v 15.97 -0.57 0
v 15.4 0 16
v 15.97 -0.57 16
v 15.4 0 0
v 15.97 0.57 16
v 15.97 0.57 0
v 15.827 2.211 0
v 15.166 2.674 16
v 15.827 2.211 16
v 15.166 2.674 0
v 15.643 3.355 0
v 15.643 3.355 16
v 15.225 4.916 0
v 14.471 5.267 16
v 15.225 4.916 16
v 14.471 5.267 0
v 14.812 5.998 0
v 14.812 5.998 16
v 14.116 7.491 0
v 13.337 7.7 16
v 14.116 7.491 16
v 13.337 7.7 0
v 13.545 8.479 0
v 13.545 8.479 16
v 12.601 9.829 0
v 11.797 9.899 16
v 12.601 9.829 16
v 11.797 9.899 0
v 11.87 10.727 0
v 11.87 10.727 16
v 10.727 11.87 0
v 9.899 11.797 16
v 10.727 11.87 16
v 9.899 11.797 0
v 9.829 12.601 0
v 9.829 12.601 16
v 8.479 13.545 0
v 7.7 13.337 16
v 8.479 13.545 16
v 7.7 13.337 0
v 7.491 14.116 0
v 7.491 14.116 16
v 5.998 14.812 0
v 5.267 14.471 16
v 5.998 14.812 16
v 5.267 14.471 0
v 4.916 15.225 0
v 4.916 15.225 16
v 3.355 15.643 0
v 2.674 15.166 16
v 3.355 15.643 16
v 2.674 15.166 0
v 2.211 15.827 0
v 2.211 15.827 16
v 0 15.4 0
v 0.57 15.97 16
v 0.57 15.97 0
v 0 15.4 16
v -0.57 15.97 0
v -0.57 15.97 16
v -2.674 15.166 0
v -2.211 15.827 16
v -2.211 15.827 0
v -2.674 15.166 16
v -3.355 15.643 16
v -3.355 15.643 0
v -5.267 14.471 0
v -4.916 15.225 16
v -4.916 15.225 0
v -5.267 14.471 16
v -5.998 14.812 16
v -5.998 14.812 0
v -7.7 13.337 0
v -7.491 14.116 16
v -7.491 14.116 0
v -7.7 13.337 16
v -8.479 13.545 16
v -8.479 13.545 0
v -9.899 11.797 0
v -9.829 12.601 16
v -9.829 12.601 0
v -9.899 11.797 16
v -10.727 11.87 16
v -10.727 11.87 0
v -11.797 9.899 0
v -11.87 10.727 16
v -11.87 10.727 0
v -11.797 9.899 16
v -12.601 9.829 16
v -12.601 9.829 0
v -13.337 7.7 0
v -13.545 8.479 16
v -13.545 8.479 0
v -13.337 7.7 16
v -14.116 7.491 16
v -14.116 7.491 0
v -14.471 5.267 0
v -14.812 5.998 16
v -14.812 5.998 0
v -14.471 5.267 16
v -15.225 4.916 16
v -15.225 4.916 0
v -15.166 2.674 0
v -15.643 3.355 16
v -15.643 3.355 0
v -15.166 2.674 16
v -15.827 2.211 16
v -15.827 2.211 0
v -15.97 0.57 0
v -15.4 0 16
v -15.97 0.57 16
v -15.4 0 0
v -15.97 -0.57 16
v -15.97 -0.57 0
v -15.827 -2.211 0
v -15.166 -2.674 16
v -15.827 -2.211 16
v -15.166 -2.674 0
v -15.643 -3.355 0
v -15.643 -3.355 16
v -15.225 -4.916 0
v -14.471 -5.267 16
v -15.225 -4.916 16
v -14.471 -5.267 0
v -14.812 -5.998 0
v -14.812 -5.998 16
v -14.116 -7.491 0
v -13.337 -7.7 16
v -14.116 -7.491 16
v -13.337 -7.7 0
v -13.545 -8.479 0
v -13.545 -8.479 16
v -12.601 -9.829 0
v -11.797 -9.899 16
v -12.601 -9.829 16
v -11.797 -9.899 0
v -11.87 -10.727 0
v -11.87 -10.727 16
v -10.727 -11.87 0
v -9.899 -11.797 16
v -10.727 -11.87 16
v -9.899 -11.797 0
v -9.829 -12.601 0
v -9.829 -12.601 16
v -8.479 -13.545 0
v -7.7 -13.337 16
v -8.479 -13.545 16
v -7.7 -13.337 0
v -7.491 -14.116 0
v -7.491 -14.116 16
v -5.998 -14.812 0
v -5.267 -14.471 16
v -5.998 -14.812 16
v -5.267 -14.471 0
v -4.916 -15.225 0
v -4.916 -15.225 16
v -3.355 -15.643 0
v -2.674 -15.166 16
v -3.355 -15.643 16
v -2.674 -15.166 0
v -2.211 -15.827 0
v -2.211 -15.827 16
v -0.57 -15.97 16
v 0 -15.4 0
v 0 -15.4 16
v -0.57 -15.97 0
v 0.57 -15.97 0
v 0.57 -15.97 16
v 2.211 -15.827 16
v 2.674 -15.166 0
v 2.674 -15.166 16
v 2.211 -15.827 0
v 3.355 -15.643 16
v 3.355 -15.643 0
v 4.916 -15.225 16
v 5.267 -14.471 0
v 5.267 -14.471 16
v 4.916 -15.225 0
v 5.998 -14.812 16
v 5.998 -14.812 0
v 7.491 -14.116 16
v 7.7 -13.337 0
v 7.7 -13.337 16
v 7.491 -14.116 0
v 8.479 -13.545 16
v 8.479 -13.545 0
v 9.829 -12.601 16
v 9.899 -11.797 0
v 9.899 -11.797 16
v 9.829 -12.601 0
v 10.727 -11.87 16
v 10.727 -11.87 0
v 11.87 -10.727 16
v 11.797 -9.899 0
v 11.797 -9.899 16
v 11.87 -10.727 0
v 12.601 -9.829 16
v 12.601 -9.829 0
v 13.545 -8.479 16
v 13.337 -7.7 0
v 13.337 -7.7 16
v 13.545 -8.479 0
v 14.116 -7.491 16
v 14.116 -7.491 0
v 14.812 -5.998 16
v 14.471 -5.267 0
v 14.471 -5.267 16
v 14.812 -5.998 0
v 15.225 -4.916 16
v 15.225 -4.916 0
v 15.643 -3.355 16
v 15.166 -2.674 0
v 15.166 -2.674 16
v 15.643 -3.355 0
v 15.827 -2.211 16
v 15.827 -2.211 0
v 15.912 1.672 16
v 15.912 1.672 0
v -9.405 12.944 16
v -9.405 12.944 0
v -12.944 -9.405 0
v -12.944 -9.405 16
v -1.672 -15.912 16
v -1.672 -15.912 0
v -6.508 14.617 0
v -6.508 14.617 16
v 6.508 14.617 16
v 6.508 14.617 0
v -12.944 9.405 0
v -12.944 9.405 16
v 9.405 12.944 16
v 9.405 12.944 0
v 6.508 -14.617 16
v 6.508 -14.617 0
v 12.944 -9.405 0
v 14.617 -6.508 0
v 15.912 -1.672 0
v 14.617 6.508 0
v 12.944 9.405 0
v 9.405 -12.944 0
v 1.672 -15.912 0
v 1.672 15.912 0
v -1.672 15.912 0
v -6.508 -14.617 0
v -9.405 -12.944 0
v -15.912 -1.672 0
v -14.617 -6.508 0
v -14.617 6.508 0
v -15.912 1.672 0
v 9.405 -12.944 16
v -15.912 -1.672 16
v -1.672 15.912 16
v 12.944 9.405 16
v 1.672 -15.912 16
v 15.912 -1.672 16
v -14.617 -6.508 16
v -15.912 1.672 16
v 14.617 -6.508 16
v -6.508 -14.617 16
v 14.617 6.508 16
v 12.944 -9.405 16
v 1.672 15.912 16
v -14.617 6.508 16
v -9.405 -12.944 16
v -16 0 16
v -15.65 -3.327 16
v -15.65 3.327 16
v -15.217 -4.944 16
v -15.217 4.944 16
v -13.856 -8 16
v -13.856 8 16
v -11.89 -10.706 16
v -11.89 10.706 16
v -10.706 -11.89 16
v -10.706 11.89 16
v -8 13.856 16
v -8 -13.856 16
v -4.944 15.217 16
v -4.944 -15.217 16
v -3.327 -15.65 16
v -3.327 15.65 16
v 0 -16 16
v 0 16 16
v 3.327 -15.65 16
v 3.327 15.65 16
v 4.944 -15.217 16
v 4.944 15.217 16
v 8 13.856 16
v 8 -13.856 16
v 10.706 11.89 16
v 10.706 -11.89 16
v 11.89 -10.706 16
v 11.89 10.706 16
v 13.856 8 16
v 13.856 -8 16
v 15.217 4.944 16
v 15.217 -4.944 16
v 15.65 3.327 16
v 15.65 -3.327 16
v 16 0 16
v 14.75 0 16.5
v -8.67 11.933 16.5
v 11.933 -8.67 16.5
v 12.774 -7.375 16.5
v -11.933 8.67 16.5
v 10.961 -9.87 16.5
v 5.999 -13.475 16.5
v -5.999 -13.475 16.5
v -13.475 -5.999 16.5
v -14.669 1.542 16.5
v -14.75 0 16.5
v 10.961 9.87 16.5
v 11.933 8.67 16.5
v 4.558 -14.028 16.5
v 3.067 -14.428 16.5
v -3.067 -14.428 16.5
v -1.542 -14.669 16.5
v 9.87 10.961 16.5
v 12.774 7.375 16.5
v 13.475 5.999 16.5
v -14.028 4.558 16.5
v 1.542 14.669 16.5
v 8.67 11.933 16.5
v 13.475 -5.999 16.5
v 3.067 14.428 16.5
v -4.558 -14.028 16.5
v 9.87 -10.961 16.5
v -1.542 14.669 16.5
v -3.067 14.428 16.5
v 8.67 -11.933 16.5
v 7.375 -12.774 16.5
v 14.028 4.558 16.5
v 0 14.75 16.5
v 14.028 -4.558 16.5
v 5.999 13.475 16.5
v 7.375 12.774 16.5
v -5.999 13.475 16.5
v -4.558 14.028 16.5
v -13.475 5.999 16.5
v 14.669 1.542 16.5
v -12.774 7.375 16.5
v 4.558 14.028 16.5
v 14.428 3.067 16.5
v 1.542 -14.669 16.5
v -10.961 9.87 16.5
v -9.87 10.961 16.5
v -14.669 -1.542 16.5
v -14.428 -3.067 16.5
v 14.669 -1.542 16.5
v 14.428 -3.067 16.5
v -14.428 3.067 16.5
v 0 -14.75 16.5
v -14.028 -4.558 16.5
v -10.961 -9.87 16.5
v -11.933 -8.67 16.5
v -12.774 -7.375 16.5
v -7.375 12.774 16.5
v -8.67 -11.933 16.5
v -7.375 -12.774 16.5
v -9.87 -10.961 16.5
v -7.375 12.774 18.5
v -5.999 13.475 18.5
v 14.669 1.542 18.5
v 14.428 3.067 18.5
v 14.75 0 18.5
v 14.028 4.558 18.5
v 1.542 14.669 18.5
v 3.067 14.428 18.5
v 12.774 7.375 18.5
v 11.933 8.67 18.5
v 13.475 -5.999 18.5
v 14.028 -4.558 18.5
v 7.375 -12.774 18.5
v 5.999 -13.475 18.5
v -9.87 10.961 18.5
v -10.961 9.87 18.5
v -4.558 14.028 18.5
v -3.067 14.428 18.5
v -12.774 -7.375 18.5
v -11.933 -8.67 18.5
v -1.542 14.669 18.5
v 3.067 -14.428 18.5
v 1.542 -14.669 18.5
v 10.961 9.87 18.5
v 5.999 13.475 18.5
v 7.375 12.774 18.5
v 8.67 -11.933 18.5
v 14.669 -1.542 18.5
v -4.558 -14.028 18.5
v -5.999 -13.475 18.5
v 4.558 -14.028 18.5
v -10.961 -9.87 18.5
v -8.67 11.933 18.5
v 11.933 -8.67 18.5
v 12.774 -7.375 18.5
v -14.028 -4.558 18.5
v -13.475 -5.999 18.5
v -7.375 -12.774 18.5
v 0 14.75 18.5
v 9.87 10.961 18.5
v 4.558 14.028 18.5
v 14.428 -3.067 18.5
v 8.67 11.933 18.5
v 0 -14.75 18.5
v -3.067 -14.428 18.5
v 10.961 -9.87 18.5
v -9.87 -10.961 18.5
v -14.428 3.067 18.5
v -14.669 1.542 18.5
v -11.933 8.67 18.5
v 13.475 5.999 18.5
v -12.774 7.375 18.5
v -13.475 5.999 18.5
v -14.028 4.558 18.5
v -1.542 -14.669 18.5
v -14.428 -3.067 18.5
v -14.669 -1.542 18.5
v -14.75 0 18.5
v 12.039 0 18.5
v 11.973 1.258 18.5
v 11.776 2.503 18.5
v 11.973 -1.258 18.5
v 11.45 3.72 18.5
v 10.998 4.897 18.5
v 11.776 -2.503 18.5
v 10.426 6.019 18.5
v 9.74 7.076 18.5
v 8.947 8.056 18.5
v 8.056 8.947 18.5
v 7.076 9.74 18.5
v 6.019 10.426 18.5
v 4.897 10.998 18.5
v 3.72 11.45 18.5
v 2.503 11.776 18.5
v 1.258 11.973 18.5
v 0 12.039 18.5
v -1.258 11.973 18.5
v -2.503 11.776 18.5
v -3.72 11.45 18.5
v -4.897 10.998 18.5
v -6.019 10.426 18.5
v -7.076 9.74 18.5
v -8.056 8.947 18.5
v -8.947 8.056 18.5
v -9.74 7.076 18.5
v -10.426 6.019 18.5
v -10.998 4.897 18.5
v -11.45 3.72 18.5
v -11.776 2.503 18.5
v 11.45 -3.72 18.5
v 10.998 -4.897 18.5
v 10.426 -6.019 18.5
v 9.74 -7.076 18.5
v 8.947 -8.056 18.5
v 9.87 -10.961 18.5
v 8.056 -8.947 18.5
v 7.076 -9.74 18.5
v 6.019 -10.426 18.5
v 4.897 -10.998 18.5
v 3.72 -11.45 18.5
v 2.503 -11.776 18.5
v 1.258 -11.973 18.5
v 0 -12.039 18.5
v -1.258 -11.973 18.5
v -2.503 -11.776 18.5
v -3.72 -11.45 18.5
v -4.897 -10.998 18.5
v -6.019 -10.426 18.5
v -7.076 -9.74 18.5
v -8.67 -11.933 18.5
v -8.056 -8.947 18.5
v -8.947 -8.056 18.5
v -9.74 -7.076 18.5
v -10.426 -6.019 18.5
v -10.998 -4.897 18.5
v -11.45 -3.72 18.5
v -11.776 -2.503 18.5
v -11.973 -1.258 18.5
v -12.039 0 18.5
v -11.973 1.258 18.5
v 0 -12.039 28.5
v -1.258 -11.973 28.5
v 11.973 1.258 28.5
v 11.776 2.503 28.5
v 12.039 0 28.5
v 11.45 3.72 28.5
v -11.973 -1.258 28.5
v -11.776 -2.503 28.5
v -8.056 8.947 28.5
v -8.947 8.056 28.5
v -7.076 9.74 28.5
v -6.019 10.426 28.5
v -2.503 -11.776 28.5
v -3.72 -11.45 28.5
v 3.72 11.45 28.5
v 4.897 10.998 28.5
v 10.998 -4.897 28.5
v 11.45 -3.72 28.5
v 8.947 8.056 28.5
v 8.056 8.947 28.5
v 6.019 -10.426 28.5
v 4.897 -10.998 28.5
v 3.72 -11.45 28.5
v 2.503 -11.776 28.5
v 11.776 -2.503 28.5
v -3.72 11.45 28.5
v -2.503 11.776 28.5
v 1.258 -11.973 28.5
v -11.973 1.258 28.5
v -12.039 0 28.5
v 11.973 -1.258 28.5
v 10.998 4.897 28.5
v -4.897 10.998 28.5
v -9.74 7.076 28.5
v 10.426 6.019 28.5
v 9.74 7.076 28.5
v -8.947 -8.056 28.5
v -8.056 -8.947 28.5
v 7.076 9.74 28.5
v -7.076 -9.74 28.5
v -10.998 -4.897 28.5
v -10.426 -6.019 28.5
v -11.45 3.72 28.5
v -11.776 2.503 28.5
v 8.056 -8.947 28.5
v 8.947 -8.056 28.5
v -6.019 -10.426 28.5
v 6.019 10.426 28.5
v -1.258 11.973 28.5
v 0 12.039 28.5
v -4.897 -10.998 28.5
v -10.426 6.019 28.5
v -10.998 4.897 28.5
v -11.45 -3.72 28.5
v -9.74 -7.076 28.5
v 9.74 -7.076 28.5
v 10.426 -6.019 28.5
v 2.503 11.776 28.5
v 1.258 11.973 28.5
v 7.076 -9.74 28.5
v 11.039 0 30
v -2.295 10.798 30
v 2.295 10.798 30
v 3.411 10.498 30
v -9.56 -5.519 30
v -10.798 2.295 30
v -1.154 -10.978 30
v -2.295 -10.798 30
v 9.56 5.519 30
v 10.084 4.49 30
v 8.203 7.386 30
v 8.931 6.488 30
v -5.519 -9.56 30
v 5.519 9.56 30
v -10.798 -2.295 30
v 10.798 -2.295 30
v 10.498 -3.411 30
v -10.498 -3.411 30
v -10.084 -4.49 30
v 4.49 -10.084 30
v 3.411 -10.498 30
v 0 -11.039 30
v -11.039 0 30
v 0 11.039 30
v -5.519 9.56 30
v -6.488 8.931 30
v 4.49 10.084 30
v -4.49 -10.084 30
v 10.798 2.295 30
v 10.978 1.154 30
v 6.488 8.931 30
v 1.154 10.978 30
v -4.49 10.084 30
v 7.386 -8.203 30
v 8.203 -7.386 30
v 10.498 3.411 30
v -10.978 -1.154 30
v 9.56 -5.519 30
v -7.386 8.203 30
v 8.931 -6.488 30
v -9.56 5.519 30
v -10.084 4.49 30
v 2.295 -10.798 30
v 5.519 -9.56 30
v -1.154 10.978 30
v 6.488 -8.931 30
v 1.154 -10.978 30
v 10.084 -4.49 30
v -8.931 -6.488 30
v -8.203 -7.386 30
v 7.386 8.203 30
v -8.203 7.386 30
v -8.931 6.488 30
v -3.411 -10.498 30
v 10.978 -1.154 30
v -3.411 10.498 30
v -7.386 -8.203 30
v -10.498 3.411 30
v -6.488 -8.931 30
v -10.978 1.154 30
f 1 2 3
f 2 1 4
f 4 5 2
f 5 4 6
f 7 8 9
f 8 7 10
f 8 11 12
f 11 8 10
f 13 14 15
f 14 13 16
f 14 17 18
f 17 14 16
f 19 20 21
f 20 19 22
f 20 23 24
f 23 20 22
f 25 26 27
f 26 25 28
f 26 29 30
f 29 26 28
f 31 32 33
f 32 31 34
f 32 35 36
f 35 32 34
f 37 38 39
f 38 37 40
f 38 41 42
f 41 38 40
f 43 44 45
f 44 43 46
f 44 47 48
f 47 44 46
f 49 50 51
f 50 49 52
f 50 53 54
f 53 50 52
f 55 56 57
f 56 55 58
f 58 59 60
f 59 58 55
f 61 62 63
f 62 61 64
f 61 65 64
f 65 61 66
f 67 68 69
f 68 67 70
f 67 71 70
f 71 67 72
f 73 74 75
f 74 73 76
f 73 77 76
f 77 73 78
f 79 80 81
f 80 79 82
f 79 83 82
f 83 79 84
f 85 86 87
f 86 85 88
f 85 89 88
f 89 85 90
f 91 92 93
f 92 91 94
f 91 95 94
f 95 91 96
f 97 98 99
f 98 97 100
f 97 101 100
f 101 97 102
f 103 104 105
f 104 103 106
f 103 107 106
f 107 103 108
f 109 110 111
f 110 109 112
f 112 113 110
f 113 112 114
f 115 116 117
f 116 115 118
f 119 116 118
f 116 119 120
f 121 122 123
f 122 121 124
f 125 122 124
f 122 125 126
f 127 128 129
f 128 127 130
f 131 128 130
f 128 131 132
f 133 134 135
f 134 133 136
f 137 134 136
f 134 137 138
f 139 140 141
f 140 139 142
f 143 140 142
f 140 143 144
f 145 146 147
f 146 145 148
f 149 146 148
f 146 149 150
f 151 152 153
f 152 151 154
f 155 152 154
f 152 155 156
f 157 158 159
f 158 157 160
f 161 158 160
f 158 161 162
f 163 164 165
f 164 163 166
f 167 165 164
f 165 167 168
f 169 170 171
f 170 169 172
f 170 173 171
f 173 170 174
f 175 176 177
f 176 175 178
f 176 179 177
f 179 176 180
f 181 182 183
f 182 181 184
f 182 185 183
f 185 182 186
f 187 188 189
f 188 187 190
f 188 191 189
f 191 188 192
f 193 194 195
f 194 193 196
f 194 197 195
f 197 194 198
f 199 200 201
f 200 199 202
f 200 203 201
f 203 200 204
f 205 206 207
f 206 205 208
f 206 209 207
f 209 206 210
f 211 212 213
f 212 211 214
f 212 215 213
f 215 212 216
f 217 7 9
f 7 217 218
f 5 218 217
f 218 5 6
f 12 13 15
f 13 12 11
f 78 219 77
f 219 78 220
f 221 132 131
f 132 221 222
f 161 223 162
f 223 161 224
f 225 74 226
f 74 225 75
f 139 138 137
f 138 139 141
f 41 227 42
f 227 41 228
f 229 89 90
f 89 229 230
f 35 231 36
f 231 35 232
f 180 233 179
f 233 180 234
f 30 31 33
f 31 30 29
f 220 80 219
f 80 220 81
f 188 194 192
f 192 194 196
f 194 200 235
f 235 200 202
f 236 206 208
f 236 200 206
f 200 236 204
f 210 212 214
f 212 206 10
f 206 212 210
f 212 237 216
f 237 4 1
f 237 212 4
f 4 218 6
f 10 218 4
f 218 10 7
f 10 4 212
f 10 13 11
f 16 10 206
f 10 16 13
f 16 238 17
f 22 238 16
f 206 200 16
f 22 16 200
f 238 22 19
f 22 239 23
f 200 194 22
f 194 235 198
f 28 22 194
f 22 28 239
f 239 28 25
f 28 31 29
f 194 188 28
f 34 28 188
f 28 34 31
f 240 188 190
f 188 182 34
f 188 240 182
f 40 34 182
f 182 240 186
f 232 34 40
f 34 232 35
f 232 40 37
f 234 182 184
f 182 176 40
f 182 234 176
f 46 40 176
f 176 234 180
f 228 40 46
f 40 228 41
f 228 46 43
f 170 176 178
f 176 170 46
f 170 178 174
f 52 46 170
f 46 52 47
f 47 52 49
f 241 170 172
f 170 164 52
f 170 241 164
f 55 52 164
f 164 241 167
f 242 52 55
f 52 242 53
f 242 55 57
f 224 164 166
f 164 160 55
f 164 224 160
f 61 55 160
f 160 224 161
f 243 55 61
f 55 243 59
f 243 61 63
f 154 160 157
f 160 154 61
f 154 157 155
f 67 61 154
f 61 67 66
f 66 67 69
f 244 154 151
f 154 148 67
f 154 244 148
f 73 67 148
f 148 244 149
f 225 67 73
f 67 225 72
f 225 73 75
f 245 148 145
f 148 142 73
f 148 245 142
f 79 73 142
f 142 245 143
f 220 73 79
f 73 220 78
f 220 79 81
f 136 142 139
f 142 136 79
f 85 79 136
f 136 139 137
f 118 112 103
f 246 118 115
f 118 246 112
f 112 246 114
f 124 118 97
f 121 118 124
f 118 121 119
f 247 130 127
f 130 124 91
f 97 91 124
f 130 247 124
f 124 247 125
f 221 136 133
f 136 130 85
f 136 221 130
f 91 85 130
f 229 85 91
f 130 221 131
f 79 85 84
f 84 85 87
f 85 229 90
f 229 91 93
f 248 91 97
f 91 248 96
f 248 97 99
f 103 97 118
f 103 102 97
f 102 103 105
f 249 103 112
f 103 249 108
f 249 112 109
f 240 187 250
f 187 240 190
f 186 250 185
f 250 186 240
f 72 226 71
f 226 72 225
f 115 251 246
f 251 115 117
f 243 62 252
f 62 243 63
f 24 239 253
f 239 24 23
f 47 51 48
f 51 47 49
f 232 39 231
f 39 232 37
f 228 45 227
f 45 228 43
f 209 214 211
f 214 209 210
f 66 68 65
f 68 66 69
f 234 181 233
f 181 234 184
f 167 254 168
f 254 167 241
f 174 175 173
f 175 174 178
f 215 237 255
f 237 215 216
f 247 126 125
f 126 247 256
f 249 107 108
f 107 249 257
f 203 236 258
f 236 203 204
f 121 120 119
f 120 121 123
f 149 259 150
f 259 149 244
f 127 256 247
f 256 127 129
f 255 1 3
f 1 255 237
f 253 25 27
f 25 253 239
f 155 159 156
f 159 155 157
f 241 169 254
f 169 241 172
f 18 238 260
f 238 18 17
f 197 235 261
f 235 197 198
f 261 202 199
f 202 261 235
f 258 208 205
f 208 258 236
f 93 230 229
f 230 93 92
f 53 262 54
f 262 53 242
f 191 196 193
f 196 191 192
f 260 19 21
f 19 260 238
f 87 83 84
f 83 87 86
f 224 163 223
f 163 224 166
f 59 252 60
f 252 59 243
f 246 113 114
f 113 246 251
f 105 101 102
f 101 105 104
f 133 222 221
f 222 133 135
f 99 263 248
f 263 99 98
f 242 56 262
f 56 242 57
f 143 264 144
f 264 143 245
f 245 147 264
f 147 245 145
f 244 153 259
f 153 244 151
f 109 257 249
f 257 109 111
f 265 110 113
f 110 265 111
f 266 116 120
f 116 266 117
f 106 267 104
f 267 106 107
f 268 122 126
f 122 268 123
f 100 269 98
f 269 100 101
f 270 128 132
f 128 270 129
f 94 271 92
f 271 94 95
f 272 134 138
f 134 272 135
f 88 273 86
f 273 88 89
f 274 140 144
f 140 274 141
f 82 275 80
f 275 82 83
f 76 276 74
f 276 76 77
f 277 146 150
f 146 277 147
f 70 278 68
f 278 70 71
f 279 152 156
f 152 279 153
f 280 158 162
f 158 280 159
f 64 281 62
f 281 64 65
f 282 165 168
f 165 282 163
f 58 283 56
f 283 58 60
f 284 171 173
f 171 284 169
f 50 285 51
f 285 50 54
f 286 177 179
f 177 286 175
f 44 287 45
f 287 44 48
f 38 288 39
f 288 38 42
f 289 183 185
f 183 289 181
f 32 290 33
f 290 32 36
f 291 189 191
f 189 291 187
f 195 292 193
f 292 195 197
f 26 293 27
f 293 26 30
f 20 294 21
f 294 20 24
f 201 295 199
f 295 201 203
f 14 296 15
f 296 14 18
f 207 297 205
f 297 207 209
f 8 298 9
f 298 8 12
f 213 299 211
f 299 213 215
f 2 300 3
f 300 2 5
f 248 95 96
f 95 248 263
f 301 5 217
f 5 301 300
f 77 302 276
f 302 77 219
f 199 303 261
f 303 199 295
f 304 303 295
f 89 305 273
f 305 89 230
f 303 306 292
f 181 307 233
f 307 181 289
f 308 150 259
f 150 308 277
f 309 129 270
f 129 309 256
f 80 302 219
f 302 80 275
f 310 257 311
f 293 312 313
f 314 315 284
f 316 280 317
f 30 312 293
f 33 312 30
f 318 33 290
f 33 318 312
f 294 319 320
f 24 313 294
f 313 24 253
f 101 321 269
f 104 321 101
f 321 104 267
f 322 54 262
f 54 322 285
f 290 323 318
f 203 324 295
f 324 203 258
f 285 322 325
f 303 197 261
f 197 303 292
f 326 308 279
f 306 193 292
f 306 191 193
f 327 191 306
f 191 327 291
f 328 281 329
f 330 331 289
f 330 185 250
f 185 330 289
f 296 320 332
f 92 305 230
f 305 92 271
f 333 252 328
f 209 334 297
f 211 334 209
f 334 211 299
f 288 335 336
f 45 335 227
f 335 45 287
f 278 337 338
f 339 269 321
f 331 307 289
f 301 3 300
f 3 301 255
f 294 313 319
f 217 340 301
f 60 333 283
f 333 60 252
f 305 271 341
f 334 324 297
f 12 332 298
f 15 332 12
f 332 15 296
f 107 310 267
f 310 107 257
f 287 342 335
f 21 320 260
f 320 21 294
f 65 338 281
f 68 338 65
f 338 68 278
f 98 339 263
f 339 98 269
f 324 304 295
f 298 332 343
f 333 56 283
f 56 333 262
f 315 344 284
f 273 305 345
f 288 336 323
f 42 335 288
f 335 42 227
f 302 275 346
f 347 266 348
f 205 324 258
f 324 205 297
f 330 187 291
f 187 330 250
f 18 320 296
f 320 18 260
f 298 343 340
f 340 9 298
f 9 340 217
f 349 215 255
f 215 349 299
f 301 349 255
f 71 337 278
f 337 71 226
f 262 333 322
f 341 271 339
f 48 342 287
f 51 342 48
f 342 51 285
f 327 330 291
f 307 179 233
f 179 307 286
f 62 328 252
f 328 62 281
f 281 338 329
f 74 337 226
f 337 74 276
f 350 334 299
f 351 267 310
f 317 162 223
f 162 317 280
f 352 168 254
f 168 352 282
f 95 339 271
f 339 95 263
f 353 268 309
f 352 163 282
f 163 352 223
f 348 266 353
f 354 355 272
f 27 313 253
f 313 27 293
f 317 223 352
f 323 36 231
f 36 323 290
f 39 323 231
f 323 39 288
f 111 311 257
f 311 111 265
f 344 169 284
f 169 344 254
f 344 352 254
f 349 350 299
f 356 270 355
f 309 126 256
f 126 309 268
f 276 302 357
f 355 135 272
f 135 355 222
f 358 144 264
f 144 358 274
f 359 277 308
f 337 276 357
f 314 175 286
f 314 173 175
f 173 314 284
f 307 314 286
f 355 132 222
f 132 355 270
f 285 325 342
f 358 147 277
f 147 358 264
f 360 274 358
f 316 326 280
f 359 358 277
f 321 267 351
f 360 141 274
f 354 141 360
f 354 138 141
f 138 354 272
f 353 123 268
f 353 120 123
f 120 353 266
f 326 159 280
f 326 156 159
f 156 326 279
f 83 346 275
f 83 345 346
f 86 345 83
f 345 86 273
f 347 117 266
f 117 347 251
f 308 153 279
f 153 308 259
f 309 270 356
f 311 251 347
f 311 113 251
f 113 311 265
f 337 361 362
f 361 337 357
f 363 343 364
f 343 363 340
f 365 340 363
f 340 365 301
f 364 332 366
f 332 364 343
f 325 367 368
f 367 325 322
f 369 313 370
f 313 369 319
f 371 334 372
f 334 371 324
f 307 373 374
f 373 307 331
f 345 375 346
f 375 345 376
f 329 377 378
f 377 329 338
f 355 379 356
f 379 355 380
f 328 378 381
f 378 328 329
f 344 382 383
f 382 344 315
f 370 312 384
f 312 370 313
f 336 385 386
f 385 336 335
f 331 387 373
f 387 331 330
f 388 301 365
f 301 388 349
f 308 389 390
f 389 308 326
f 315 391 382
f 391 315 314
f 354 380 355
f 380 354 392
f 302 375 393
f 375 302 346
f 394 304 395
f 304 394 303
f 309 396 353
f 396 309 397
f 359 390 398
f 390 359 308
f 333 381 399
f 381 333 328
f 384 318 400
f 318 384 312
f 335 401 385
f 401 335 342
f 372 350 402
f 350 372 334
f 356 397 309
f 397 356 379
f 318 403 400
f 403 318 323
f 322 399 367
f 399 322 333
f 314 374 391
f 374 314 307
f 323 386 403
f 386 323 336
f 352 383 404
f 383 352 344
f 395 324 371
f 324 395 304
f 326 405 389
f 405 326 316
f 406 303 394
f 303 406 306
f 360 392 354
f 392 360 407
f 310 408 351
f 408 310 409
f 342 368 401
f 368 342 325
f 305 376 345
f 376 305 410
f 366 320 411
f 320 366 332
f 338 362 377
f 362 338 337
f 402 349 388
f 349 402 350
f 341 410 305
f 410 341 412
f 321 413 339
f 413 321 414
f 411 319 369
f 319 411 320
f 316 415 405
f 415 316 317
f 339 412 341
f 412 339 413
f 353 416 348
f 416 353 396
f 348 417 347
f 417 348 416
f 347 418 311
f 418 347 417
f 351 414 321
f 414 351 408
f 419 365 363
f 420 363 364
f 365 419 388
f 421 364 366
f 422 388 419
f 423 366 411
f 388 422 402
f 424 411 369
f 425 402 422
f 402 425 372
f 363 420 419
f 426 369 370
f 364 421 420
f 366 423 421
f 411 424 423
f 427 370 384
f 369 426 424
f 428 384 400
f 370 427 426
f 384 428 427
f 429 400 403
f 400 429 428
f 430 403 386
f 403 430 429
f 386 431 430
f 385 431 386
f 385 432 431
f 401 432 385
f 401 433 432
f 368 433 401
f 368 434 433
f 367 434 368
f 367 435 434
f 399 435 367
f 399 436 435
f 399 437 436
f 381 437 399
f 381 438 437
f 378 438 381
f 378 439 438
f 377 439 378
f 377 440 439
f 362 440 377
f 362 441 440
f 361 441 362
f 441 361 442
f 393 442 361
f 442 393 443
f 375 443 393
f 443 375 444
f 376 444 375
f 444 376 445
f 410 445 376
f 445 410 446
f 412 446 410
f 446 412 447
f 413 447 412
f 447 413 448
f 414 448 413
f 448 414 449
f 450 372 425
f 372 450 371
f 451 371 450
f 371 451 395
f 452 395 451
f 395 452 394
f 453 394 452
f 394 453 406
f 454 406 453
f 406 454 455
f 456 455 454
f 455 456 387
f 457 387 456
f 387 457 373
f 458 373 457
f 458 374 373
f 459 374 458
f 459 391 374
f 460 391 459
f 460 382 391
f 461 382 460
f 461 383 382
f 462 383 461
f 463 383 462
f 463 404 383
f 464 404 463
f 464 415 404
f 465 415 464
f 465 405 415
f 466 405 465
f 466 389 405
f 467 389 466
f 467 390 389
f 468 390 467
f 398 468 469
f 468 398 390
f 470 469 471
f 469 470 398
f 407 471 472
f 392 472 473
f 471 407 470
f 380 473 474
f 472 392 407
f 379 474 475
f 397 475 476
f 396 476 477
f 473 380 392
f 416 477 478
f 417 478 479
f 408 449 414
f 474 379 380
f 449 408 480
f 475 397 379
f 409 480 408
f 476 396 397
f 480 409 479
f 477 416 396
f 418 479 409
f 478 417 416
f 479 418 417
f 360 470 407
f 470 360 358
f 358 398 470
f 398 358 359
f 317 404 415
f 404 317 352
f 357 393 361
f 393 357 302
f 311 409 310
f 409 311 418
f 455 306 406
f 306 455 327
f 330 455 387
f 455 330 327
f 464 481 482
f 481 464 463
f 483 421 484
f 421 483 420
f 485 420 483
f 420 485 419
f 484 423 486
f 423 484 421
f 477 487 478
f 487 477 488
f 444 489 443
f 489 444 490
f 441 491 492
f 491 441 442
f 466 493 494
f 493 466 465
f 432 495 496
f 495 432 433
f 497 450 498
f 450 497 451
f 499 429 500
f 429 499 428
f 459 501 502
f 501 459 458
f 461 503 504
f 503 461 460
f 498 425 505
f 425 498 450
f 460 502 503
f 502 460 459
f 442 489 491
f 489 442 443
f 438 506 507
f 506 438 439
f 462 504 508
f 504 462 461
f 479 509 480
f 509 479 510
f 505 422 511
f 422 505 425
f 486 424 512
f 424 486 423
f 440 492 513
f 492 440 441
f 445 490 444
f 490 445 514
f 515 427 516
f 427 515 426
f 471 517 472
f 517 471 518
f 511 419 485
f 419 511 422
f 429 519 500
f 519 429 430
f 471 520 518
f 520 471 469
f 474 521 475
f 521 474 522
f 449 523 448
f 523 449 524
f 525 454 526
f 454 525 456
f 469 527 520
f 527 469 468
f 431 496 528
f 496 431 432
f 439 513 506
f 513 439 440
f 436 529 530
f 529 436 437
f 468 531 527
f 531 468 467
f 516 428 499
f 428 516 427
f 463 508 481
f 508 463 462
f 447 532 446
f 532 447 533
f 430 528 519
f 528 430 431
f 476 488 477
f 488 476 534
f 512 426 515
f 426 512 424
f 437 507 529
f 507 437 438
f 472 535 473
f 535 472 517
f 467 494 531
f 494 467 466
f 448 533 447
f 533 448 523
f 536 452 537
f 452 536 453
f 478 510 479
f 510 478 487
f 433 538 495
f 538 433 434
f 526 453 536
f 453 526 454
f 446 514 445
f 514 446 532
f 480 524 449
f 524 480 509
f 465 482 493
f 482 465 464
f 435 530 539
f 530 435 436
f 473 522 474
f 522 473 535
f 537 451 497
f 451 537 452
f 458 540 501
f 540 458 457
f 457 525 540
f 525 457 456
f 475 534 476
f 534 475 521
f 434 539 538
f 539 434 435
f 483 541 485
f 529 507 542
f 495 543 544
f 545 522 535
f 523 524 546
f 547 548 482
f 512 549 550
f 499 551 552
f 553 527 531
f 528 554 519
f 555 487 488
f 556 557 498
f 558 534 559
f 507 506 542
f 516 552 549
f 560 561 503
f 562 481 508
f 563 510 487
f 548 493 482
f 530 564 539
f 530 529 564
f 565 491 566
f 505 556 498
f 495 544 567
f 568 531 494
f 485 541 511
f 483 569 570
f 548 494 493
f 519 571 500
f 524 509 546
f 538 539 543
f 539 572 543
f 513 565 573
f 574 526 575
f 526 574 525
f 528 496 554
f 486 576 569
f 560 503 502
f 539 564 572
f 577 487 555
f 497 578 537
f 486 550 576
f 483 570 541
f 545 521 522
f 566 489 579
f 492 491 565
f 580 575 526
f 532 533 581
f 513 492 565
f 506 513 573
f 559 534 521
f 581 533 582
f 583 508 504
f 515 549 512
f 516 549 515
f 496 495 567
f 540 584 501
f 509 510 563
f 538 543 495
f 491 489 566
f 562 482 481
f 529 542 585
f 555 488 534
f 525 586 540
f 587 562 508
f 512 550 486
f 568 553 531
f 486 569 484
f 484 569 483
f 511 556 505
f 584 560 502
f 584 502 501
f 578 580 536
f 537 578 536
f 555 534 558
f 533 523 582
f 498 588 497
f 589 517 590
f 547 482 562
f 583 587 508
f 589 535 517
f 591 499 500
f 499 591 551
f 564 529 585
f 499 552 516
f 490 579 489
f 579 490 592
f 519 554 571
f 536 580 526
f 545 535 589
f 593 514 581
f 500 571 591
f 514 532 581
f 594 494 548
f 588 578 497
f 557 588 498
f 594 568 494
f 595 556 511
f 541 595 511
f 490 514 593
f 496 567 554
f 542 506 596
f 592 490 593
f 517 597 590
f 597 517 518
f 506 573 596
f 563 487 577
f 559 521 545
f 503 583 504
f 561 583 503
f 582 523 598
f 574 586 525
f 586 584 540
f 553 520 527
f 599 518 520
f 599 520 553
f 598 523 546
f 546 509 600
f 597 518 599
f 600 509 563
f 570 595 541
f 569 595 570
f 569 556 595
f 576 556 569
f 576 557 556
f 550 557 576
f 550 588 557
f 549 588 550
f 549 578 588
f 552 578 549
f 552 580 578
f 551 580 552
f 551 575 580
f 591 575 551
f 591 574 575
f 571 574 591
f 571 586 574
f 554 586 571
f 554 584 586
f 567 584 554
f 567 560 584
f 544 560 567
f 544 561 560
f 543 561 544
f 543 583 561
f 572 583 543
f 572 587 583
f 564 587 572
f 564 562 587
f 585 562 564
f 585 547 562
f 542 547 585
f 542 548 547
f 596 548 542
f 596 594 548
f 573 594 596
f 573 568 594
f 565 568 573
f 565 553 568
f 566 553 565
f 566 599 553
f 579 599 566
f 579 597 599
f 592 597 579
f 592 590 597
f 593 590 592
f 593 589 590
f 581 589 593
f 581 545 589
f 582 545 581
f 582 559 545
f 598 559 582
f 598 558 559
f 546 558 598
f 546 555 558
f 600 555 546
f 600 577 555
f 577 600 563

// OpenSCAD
/*
================================================================================
                       PARAMETRIC G3/4" THREADED PLUG
                            Version: v0.01
       Designed for sealing washing machine water inlets and hose couplings
================================================================================

This is a parametric, self-contained OpenSCAD model for a G3/4" threaded plug.
It features a long knurled knob head optimized for tightening and loosening by
hand, without requiring a wrench.

--------------------------------------------------------------------------------
RECOMMENDED PRINT SETTINGS & MATERIAL INSTRUCTIONS:
--------------------------------------------------------------------------------
1. MATERIAL:
   - PETG, ABS, or ASA are highly recommended for plumbing applications.
   - PLA is not recommended for long-term pressurized water use.
2. INFILL & PERIMETERS:
   - Use at least 4-6 perimeters (wall lines) to ensure the plug is watertight.
   - Infill should be high (50% to 100%) for mechanical strength.
3. ORIENTATION:
   - Print with the flat head/knob sitting on the bed and the threads pointing
     upwards. This orientation requires ZERO supports and ensures the sealing
     face of the flange is extremely smooth and flat.
4. SEALING:
   - Always use a standard rubber/silicone washer inside the female connector.
   - For an extra reliable seal, wrap a few turns of PTFE (Teflon) plumber's
     tape around the threads before screwing it in.
================================================================================
*/

/* [Thread Settings] */

// Thread standard (Washing Machine standard is G3/4 BSP)
thread_standard = "G3/4"; // [G3/4: "G3/4 BSP (Washing Machine Standard)", GHT3/4: "3/4\" GHT (Garden Hose Standard)", Custom: "Custom Thread"]

// Major diameter (mm) - only used if Custom standard is selected
custom_major_diameter = 26.44;

// Pitch in mm (14 TPI = 1.8143mm, 11.5 TPI = 2.2087mm) - only used if Custom standard is selected
custom_pitch = 1.8143;

// Total length of the threaded portion (mm)
thread_length = 11.5;

// Outer diameter clearance/tolerance (mm) - increase if thread is too tight, decrease if too loose
thread_tolerance = 0.15;

/* [Knob Head & Sealing Flange] */

// Height of the knurled knob head (mm) - long design for easy hand grip
knob_height = 16.0;

// Outer diameter of the knurled knob head (mm)
knob_diameter = 32.0;

// Number of vertical knurling ridges around the knob
knurling_ridges = 36;

// Depth of the knurling ridges (mm)
knurling_depth = 0.6;

// Diameter of the sealing flange/shoulder (mm) - should be wider than the thread to press the gasket
flange_diameter = 29.5;

// Thickness of the sealing flange (mm)
flange_thickness = 2.5;

/* [Quality / Resolution] */

// Number of steps per 360-degree turn (higher means smoother threads but slower rendering)
steps_per_turn = 60; // [30:Draft, 60:Medium, 120:High]

/* [Hidden] */
$fn = steps_per_turn;

// --- DYNAMIC CALCULATIONS ---

// Extract standard thread parameters based on user selection
major_dia = (thread_standard == "G3/4") ? 26.441 - thread_tolerance :
            (thread_standard == "GHT3/4") ? 26.987 - thread_tolerance :
            custom_major_diameter - thread_tolerance;

pitch = (thread_standard == "G3/4") ? 1.8143 :
        (thread_standard == "GHT3/4") ? 2.2087 :
        custom_pitch;

// --- MAIN GENERATION ---

union() {
    // 1. Knurled Grip Head (Knob)
    knurled_cylinder(d=knob_diameter, h=knob_height, ridges=knurling_ridges, depth=knurling_depth);

    // 2. Sealing Flange / Shoulder (Provides flat surface for rubber gasket)
    translate([0, 0, knob_height]) {
        // Flat flange with a small transition chamfer on the bottom/outer edge
        cylinder(d1=knob_diameter, d2=flange_diameter, h=0.5);
        translate([0, 0, 0.5])
            cylinder(d=flange_diameter, h=flange_thickness - 0.5);
    }

    // 3. Threaded Shaft (Positioned above the flange)
    translate([0, 0, knob_height + flange_thickness]) {
        threaded_shaft(diameter=major_dia, pitch=pitch, length=thread_length, steps=steps_per_turn);
    }
}

// --- HELPER MODULES ---

// Generates a knurled cylinder with vertical grip ridges
module knurled_cylinder(d, h, ridges, depth) {
    difference() {
        cylinder(d=d, h=h);
        // Cut vertical 90-degree triangular grooves into the cylinder edge
        for (i = [0 : ridges - 1]) {
            rotate([0, 0, i * 360 / ridges])
            translate([d/2, 0, h/2])
            rotate([0, 0, 45])
            cube([depth * sqrt(2), depth * sqrt(2), h + 2], center=true);
        }
    }
}

// Generates the solid core and the tapered thread helix
module threaded_shaft(diameter, pitch, length, steps) {
    depth = pitch * 0.61;
    r_outer = diameter / 2;
    r_inner = r_outer - depth;

    // Smooth chamfer at the tip of the core cylinder to guide thread start
    chamfer_h = min(1.5, length * 0.15);

    union() {
        // Solid core cylinder with tapered tip
        cylinder(r=r_inner, h=length - chamfer_h, $fn=steps);
        translate([0, 0, length - chamfer_h])
            cylinder(r1=r_inner, r2=r_inner - 1.0, h=chamfer_h, $fn=steps);

        // Helical thread geometry
        male_thread(diameter=diameter, pitch=pitch, length=length, steps_per_turn=steps);
    }
}

// Generates a watertight thread polyhedron with tapered entry and exit
module male_thread(diameter, pitch, length, steps_per_turn) {
    depth = pitch * 0.61;
    crest_flat = pitch * 0.125;
    r_outer = diameter / 2;
    r_inner = r_outer - depth;

    // Ensure we have at least 1 turn
    turns = max(1.0, (length - pitch) / pitch);
    total_steps = ceil(turns * steps_per_turn);
    dz = pitch / steps_per_turn;
    step_angle = 360 / steps_per_turn;

    // Calculate all vertex positions along the helical path
    vertices = [
        for (i = [0 : total_steps])
        let (
            a = i * step_angle,
            z = i * dz,

            // Apply smoothing/taper over the first and last turn
            taper_start = (i < steps_per_turn) ? (0.01 + 0.99 * i / steps_per_turn) : 1.0,
            taper_end = (i > total_steps - steps_per_turn) ? (0.01 + 0.99 * (total_steps - i) / steps_per_turn) : 1.0,
            taper = min(taper_start, taper_end),

            r_out_eff = r_inner + (r_outer - r_inner) * taper,
            cf_eff = crest_flat * taper,

            // Four points of the trapezoidal thread tooth cross-section
            v0 = [ r_inner * cos(a), r_inner * sin(a), z ],
            v1 = [ r_out_eff * cos(a), r_out_eff * sin(a), z + (pitch - cf_eff)/2 ],
            v2 = [ r_out_eff * cos(a), r_out_eff * sin(a), z + (pitch + cf_eff)/2 ],
            v3 = [ r_inner * cos(a), r_inner * sin(a), z + pitch ]
        )
        each [v0, v1, v2, v3]
    ];

    // Define the faces connecting the vertices to form a closed watertight volume
    faces = [
        // Start cap (flat face at z = 0)
        [0, 1, 2, 3],

        // Helical segments wrapping around the cylinder
        for (i = [0 : total_steps - 1])
        each [
            [4*i + 0, 4*(i+1) + 0, 4*(i+1) + 1, 4*i + 1], // Bottom flank (slanted face)
            [4*i + 1, 4*(i+1) + 1, 4*(i+1) + 2, 4*i + 2], // Crest flat (outer face)
            [4*i + 2, 4*(i+1) + 2, 4*(i+1) + 3, 4*i + 3], // Top flank (slanted face)
            [4*i + 0, 4*i + 3, 4*(i+1) + 3, 4*(i+1) + 0]  // Inner core (cylinder face)
        ],

        // End cap (flat face at z = length)
        [4*total_steps + 3, 4*total_steps + 2, 4*total_steps + 1, 4*total_steps + 0]
    ];

    polyhedron(points=vertices, faces=faces, convexity=10);
}
